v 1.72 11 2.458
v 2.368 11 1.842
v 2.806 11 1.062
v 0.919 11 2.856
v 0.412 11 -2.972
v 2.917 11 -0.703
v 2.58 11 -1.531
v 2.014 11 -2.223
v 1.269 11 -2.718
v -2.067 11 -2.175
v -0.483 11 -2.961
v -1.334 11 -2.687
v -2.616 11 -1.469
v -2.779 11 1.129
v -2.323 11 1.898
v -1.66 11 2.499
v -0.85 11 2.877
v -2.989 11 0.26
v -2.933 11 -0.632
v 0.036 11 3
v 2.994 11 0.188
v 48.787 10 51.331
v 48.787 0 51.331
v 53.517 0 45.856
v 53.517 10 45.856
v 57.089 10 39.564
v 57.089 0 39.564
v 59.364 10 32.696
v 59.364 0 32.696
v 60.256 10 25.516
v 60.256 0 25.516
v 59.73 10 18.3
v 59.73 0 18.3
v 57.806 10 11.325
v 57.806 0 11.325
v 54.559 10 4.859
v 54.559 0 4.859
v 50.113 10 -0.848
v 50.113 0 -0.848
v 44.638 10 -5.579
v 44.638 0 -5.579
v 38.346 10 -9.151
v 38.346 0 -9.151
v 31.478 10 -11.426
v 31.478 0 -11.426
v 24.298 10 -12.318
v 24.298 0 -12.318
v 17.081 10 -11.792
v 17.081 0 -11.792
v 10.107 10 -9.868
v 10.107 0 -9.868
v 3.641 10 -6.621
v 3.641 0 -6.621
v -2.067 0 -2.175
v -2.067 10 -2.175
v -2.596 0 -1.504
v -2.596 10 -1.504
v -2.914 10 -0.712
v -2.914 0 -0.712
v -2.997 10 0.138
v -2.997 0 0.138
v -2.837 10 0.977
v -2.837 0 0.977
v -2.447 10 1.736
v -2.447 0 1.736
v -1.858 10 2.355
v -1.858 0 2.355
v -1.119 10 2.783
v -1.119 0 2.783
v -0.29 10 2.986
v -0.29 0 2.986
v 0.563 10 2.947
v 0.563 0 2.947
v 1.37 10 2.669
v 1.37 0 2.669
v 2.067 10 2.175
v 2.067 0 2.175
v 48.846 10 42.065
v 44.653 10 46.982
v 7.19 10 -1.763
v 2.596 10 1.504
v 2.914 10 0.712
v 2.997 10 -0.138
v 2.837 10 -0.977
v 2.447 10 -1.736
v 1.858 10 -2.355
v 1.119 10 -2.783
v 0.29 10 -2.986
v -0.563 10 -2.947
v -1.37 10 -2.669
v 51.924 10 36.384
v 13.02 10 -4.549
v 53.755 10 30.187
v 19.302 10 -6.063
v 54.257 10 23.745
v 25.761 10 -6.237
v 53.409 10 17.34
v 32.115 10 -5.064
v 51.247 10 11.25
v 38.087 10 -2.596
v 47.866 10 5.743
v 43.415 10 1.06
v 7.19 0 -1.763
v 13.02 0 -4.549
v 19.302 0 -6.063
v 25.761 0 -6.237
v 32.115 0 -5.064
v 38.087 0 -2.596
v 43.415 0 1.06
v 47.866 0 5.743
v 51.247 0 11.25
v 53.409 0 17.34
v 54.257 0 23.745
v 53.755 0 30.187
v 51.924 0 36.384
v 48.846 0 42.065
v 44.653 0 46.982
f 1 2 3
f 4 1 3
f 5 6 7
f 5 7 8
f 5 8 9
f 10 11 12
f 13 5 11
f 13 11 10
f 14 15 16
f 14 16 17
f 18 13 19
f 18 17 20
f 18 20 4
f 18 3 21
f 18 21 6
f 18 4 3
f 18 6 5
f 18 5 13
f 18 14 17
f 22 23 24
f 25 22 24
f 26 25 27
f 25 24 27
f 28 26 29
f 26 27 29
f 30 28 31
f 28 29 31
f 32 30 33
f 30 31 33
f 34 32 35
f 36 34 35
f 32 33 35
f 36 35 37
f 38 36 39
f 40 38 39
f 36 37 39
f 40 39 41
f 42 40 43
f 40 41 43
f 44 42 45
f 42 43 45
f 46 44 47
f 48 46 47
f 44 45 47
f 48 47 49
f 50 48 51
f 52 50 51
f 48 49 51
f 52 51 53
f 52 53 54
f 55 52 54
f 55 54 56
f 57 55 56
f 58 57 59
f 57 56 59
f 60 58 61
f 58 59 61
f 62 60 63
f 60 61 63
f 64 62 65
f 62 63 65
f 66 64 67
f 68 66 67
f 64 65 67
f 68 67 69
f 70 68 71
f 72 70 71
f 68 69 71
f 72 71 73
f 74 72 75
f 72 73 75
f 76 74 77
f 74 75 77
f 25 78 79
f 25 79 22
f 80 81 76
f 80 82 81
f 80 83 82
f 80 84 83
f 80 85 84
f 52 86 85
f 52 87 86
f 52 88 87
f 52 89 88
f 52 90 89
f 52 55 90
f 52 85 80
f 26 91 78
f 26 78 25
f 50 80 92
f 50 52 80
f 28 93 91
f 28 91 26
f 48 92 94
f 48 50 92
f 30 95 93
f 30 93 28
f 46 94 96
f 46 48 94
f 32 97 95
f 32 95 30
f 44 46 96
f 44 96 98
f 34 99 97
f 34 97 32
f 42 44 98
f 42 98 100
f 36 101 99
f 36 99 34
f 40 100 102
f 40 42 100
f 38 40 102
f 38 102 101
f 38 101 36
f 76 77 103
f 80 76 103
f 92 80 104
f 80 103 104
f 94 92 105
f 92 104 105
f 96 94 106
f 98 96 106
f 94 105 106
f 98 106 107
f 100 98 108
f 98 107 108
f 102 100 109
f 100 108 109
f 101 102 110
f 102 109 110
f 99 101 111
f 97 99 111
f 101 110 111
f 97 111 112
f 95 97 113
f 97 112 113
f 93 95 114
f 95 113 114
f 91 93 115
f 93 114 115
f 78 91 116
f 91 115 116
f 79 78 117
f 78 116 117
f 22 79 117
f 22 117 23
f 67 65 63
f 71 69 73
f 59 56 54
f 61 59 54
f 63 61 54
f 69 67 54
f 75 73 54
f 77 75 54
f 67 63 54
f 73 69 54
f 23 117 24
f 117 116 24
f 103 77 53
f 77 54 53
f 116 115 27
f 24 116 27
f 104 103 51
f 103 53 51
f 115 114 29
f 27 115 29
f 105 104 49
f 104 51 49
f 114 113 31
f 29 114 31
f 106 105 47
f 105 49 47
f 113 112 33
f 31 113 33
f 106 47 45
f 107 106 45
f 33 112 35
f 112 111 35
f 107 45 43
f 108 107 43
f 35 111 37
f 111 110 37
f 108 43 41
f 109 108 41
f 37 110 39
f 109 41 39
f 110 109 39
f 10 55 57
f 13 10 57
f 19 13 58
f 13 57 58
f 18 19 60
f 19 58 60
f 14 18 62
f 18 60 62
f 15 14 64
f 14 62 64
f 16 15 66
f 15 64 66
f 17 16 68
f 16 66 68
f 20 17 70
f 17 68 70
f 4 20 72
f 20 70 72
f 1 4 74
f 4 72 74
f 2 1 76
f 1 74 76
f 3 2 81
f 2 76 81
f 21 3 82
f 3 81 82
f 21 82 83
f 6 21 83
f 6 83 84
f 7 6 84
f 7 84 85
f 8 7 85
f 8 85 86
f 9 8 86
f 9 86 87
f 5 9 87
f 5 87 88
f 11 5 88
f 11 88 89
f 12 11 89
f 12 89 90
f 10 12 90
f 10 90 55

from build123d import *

# Parameters (mm, degrees)
BOSS_EXTRUDE8_DEPTH     = 10
SKETCH17_R              = 3
BOSS_EXTRUDE9_DEPTH     = 1
CUT_EXTRUDE3_DEPTH      = 48
CUT_EXTRUDE3_DEPTH_BACK = 52


with BuildPart() as part:
    # Sketch15 → Boss-Extrude8 (new body)
    with BuildSketch(Plane(origin=(0, 0, 0), x_dir=(1, 0, 0), z_dir=(0, 1, 0))):
        with BuildLine():
            ThreePointArc((48.786503152, -51.330803164), (50.112545273, 0.848485663), (-2.066743554, 2.174527784))
            ThreePointArc((-2.066743554, 2.174527784), (-2.174527784, -2.066743554), (2.066743554, -2.174527784))
            ThreePointArc((2.066743554, -2.174527784), (45.763489705, -3.285001446), (44.653016043, -46.981747597))
            ThreePointArc((44.653016043, -46.981747597), (44.545231814, -51.223018935), (48.786503152, -51.330803164))
        make_face()
    extrude(amount=BOSS_EXTRUDE8_DEPTH)

    # Sketch17 → Boss-Extrude9 (add)
    with BuildSketch(Plane(origin=(0, 10, 0), x_dir=(1, 0, 0), z_dir=(0, 1, 0))):
        with Locations(Location((0, 0, 0), (0, 0, 133.544244871))):
            Circle(SKETCH17_R)
    extrude(amount=BOSS_EXTRUDE9_DEPTH)

    # Sketch18 → Cut-Extrude3 (cut, two sides: drawn at the far end of the back side and taken through both)
    with BuildSketch(Plane(origin=(0, 10, 0), x_dir=(1, 0, 0), z_dir=(0, 1, 0)).offset(-CUT_EXTRUDE3_DEPTH_BACK)):
        with BuildLine():
            Line((44.653016043, -46.981747597), (48.786503152, -51.330803164))
            ThreePointArc((48.786503152, -51.330803164), (46.643544638, -52.155307104), (44.545231814, -51.223018935))
            ThreePointArc((44.545231814, -51.223018935), (43.720727874, -49.080060421), (44.653016043, -46.981747597))
        make_face()
    extrude(amount=CUT_EXTRUDE3_DEPTH + CUT_EXTRUDE3_DEPTH_BACK, mode=Mode.SUBTRACT)


solid = part.part
